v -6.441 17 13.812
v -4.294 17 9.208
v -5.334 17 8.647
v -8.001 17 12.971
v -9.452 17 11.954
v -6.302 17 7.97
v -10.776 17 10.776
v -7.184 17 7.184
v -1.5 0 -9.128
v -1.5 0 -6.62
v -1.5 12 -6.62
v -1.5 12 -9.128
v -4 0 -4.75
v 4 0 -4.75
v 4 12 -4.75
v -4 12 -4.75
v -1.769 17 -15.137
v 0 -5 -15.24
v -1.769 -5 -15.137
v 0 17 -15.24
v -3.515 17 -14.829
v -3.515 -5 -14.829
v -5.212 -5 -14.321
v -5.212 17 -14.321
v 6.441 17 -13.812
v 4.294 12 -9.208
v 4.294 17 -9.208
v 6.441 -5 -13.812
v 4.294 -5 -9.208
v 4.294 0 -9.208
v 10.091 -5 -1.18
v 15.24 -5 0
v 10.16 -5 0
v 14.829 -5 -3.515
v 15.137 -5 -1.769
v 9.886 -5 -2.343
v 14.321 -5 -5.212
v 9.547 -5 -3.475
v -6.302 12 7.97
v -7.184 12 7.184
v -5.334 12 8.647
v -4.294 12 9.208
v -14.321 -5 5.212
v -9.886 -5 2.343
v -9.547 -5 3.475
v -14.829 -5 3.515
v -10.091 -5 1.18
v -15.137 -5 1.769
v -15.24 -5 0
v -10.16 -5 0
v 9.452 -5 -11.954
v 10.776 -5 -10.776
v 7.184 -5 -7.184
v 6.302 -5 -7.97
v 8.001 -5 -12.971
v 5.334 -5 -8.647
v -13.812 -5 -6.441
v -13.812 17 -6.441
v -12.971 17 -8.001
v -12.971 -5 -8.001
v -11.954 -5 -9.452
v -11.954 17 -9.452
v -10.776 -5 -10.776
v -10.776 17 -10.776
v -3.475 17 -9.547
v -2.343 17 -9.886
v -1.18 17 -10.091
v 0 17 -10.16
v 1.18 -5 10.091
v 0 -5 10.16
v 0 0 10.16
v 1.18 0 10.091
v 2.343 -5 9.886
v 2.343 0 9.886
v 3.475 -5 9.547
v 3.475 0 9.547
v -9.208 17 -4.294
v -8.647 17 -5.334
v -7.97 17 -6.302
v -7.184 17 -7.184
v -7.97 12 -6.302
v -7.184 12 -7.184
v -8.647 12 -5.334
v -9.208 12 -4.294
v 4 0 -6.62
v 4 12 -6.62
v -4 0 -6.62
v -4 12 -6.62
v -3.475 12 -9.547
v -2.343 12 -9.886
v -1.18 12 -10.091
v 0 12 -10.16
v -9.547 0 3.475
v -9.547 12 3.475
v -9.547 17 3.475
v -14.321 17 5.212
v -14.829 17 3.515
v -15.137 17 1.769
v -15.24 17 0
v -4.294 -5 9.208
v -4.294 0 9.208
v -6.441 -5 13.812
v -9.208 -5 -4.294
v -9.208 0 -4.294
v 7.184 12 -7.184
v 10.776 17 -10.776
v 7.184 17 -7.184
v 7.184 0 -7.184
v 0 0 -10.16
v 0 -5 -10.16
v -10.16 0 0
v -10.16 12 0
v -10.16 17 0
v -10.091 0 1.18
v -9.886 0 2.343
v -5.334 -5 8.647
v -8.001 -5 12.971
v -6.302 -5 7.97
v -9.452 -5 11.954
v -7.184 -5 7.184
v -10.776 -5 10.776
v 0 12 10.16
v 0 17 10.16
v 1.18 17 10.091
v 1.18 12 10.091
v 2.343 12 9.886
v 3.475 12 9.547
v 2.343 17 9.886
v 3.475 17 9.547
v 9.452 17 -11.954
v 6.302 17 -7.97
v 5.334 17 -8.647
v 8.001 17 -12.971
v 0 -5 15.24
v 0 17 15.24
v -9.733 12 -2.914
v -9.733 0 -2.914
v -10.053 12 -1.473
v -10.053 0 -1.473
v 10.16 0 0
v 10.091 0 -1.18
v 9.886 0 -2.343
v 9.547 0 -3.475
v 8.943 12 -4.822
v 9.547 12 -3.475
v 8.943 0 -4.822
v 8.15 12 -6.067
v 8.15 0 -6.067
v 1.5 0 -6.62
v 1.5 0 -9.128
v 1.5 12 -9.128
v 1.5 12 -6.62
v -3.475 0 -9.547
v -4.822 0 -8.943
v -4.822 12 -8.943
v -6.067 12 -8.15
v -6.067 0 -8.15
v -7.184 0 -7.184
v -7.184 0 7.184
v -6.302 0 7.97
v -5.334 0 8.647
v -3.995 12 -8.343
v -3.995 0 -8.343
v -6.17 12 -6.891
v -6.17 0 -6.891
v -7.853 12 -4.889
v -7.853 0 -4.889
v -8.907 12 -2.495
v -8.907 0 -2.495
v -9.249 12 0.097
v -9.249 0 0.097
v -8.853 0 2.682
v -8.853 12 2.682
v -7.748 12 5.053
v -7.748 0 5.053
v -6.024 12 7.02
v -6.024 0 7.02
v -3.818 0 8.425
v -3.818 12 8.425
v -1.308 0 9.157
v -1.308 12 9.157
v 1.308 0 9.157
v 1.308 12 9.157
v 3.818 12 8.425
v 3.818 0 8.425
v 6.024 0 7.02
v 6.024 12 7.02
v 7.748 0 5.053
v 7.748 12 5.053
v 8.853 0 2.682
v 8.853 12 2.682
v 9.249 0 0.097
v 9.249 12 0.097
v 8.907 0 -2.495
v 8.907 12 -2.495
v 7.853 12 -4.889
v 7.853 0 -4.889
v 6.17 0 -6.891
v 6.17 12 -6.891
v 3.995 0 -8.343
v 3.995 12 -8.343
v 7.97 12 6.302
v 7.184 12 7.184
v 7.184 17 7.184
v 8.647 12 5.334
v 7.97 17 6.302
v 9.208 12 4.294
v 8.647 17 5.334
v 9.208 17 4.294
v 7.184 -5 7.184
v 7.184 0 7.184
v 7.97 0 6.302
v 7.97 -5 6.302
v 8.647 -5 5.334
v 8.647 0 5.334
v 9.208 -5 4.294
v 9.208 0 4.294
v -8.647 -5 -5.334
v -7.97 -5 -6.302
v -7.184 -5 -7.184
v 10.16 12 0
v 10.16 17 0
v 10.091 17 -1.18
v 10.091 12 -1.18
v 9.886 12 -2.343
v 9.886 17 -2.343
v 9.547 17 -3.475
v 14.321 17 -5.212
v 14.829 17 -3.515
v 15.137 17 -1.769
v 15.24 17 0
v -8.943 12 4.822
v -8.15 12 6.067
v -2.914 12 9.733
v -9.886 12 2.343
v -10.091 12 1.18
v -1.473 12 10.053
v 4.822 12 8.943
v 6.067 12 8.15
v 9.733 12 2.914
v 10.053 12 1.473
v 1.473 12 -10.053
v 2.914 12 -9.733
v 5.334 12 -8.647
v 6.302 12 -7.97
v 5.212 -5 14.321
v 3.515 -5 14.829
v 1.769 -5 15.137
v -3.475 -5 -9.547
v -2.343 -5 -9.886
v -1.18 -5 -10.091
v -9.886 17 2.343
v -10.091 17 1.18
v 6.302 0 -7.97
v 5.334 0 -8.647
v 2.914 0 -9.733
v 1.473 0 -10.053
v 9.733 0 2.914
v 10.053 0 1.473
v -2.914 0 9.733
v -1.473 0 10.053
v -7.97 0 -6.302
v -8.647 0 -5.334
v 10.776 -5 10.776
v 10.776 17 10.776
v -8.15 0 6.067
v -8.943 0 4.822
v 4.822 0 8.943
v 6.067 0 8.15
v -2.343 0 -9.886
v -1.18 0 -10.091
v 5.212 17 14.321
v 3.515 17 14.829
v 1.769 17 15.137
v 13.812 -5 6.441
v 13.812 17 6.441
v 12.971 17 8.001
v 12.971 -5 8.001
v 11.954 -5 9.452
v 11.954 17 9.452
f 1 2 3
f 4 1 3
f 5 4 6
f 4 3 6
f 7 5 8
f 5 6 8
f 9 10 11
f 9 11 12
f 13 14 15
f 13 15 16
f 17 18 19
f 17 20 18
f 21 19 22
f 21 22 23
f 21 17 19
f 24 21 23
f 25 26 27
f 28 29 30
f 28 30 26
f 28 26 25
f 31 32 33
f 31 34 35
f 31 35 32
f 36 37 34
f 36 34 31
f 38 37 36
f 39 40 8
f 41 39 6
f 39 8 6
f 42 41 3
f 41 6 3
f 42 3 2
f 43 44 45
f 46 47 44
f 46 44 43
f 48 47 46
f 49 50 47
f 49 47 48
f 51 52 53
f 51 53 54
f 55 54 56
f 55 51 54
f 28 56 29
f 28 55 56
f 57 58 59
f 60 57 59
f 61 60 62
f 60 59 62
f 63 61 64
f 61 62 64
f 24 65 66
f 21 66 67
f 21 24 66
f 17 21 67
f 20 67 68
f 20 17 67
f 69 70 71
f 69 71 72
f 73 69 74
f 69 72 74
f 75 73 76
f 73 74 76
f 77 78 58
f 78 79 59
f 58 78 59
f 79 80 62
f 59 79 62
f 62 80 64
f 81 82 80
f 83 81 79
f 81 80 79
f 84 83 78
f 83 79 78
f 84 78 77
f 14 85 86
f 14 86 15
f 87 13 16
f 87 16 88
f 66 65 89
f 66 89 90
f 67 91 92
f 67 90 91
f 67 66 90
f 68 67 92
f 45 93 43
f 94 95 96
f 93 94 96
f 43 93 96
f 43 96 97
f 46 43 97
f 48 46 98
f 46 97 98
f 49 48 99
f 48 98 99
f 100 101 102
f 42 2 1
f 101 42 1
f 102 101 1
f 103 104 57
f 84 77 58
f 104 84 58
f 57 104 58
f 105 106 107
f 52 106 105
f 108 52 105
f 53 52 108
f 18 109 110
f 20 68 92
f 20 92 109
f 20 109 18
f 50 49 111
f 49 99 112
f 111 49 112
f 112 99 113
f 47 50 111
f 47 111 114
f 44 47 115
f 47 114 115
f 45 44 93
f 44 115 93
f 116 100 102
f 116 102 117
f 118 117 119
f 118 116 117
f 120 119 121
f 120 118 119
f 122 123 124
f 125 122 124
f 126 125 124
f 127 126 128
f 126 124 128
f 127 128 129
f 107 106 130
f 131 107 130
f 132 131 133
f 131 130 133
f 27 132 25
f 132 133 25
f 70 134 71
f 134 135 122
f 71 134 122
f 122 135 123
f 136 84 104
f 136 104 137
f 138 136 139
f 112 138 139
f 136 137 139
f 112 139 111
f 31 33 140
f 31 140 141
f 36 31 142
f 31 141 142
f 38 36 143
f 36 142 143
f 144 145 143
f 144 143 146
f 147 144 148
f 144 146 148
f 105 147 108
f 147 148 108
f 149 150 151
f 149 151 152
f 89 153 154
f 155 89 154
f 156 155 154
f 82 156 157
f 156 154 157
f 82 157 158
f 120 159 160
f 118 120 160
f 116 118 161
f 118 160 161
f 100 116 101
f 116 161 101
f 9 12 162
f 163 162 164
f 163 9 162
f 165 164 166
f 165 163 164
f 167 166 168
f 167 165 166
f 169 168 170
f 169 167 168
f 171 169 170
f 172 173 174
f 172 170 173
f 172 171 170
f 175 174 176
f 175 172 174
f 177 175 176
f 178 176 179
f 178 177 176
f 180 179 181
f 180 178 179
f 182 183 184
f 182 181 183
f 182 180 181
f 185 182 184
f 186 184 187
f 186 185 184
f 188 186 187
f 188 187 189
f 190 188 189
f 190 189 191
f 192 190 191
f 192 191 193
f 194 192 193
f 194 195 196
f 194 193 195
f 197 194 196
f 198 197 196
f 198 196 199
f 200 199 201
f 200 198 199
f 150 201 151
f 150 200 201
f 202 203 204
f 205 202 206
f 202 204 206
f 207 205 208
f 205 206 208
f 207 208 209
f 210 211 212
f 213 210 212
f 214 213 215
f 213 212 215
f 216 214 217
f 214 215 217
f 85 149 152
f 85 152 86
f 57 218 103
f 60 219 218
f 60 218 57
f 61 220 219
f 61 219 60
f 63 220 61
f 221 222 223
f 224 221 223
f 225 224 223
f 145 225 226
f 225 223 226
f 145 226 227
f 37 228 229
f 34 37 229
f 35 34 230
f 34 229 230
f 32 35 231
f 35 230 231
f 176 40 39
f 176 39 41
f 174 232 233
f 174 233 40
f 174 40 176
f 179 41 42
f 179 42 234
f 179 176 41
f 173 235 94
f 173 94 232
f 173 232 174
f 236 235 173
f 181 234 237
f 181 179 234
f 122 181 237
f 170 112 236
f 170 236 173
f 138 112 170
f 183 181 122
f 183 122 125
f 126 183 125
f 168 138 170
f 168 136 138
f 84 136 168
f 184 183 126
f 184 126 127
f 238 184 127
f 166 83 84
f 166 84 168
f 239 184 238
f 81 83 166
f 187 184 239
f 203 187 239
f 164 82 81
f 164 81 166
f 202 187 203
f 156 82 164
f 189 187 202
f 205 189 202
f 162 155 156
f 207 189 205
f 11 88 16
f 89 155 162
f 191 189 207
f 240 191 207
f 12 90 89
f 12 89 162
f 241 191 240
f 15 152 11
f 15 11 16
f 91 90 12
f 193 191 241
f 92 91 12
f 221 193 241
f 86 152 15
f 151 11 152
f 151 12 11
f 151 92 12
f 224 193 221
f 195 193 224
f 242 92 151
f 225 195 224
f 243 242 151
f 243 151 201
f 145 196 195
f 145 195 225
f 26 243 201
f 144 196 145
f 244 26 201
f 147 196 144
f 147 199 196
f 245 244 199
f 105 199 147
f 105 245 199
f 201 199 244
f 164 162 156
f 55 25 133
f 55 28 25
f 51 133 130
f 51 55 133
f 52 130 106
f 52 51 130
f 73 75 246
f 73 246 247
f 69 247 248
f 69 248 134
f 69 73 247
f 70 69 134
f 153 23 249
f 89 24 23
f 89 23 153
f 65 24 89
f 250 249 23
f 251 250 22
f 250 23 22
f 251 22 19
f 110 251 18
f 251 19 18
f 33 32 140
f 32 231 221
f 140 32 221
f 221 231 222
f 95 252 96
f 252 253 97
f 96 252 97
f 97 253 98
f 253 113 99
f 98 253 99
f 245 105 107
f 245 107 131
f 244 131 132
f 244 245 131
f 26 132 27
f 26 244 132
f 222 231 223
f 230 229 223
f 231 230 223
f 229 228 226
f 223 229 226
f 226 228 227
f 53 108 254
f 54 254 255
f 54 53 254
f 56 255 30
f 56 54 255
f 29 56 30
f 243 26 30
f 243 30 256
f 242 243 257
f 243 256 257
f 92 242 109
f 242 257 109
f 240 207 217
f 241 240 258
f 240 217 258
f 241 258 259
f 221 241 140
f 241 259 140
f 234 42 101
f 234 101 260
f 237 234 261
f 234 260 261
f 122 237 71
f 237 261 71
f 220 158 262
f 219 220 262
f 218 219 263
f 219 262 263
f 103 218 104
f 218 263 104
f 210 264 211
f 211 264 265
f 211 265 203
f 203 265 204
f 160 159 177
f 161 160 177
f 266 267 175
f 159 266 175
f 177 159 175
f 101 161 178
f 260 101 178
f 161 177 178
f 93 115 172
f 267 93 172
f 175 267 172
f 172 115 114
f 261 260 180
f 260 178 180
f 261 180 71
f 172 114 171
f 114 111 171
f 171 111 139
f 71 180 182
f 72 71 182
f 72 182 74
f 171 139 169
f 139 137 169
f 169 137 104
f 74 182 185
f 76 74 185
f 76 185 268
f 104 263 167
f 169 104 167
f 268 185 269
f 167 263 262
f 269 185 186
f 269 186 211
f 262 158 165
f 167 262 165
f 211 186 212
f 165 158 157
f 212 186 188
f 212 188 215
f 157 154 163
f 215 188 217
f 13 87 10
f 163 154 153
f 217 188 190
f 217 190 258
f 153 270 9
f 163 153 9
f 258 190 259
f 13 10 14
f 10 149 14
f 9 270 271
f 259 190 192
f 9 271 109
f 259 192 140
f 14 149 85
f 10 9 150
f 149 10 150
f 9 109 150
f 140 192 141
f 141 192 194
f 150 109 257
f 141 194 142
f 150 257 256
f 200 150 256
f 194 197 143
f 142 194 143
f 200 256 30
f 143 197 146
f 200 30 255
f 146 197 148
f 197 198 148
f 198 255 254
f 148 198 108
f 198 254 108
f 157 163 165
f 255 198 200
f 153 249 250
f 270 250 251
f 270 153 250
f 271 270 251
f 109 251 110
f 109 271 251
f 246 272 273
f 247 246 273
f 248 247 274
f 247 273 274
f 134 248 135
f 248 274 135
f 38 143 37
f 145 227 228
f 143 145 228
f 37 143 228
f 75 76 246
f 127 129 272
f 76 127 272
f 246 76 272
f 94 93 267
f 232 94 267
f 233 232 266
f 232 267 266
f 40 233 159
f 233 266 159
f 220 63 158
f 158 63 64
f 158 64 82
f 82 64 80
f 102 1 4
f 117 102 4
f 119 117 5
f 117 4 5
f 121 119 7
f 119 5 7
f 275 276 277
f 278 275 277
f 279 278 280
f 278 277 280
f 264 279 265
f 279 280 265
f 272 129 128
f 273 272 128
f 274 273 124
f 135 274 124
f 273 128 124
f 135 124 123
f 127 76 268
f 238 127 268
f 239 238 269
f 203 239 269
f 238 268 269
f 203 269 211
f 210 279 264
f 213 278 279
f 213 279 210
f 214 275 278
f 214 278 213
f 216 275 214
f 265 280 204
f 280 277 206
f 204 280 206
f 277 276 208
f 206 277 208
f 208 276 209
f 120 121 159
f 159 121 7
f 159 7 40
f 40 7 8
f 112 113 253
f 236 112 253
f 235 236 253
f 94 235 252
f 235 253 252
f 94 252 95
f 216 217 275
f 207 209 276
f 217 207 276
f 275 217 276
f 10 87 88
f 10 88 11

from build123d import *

# Parameters (mm, degrees)
SKETCH1_R           = 10.16
SKETCH1_R_2         = 9.25
BOSS_EXTRUDE1_DEPTH = 12
BOSS_EXTRUDE3_DEPTH = 11
BOSS_EXTRUDE4_DEPTH = 12


with BuildPart() as part:
    # Sketch1 → Boss-Extrude1 (new body)
    with BuildSketch(Plane(origin=(0, 0, 0), x_dir=(1, 0, 0), z_dir=(0, 1, 0))):
        Circle(SKETCH1_R)
        Circle(SKETCH1_R_2, mode=Mode.SUBTRACT)
    extrude(amount=BOSS_EXTRUDE1_DEPTH)

    # Sketch3 → Boss-Extrude3 (add, symmetric)
    with BuildSketch(Plane(origin=(0, 6, 0), x_dir=(-1, 0, 0), z_dir=(0, -1, 0))):
        with BuildLine():
            Line((5.212386984, 14.320915541), (3.474924656, 9.547277027))
            ThreePointArc((3.474924656, 9.547277027), (1.764265485, 10.005646771), (0, 10.16))
            Line((0, 10.16), (0, 15.24))
            ThreePointArc((0, 15.24), (2.646398228, 15.008470156), (5.212386984, 14.320915541))
        make_face()
        with BuildLine():
            Line((10.776307345, 10.776307345), (7.184204897, 7.184204897))
            ThreePointArc((7.184204897, 7.184204897), (8.32258477, 5.827536593), (9.208087116, 4.293801539))
            Line((9.208087116, 4.293801539), (13.812130674, 6.440702309))
            ThreePointArc((13.812130674, 6.440702309), (12.483877155, 8.74130489), (10.776307345, 10.776307345))
        make_face()
        with BuildLine():
            Line((15.24, 0), (10.16, 0))
            ThreePointArc((10.16, 0), (10.005646771, -1.764265485), (9.547277027, -3.474924656))
            Line((9.547277027, -3.474924656), (14.320915541, -5.212386984))
            ThreePointArc((14.320915541, -5.212386984), (15.008470156, -2.646398228), (15.24, 0))
        make_face()
        with BuildLine():
            Line((10.776307345, -10.776307345), (7.184204897, -7.184204897))
            ThreePointArc((7.184204897, -7.184204897), (5.827536593, -8.32258477), (4.293801539, -9.208087116))
            Line((4.293801539, -9.208087116), (6.440702309, -13.812130674))
            ThreePointArc((6.440702309, -13.812130674), (8.74130489, -12.483877155), (10.776307345, -10.776307345))
        make_face()
        with BuildLine():
            Line((0, -15.24), (0, -10.16))
            ThreePointArc((0, -10.16), (-1.764265485, -10.005646771), (-3.474924656, -9.547277027))
            Line((-3.474924656, -9.547277027), (-5.212386984, -14.320915541))
            ThreePointArc((-5.212386984, -14.320915541), (-2.646398228, -15.008470156), (0, -15.24))
        make_face()
        with BuildLine():
            Line((-10.776307345, -10.776307345), (-7.184204897, -7.184204897))
            ThreePointArc((-7.184204897, -7.184204897), (-8.32258477, -5.827536593), (-9.208087116, -4.293801539))
            Line((-9.208087116, -4.293801539), (-13.812130674, -6.440702309))
            ThreePointArc((-13.812130674, -6.440702309), (-12.483877155, -8.74130489), (-10.776307345, -10.776307345))
        make_face()
        with BuildLine():
            Line((-15.24, 0), (-10.16, 0))
            ThreePointArc((-10.16, 0), (-10.005646771, 1.764265485), (-9.547277027, 3.474924656))
            Line((-9.547277027, 3.474924656), (-14.320915541, 5.212386984))
            ThreePointArc((-14.320915541, 5.212386984), (-15.008470156, 2.646398228), (-15.24, 0))
        make_face()
        with BuildLine():
            Line((-10.776307345, 10.776307345), (-7.184204897, 7.184204897))
            ThreePointArc((-7.184204897, 7.184204897), (-5.827536593, 8.32258477), (-4.293801539, 9.208087116))
            Line((-4.293801539, 9.208087116), (-6.440702309, 13.812130674))
            ThreePointArc((-6.440702309, 13.812130674), (-8.74130489, 12.483877155), (-10.776307345, 10.776307345))
        make_face()
    extrude(amount=BOSS_EXTRUDE3_DEPTH, both=True)

    # Sketch4 → Boss-Extrude4 (add)
    with BuildSketch(Plane.XZ):
        with BuildLine():
            Line((-4, -4.75), (-4, -6.620469825))
            Line((-4, -6.620469825), (-1.5, -6.620469825))
            Line((-1.5, -6.620469825), (-1.5, -8.620469825))
            Line((-1.5, -8.620469825), (-1.5, -9.127568132))
            ThreePointArc((-1.5, -9.127568132), (0, -9.25), (1.5, -9.127568132))
            Line((1.5, -9.127568132), (1.5, -8.620469825))
            Line((1.5, -8.620469825), (1.5, -6.620469825))
            Line((1.5, -6.620469825), (4, -6.620469825))
            Line((4, -6.620469825), (4, -4.75))
            Line((4, -4.75), (-4, -4.75))
        make_face()
    extrude(amount=-BOSS_EXTRUDE4_DEPTH)


solid = part.part
